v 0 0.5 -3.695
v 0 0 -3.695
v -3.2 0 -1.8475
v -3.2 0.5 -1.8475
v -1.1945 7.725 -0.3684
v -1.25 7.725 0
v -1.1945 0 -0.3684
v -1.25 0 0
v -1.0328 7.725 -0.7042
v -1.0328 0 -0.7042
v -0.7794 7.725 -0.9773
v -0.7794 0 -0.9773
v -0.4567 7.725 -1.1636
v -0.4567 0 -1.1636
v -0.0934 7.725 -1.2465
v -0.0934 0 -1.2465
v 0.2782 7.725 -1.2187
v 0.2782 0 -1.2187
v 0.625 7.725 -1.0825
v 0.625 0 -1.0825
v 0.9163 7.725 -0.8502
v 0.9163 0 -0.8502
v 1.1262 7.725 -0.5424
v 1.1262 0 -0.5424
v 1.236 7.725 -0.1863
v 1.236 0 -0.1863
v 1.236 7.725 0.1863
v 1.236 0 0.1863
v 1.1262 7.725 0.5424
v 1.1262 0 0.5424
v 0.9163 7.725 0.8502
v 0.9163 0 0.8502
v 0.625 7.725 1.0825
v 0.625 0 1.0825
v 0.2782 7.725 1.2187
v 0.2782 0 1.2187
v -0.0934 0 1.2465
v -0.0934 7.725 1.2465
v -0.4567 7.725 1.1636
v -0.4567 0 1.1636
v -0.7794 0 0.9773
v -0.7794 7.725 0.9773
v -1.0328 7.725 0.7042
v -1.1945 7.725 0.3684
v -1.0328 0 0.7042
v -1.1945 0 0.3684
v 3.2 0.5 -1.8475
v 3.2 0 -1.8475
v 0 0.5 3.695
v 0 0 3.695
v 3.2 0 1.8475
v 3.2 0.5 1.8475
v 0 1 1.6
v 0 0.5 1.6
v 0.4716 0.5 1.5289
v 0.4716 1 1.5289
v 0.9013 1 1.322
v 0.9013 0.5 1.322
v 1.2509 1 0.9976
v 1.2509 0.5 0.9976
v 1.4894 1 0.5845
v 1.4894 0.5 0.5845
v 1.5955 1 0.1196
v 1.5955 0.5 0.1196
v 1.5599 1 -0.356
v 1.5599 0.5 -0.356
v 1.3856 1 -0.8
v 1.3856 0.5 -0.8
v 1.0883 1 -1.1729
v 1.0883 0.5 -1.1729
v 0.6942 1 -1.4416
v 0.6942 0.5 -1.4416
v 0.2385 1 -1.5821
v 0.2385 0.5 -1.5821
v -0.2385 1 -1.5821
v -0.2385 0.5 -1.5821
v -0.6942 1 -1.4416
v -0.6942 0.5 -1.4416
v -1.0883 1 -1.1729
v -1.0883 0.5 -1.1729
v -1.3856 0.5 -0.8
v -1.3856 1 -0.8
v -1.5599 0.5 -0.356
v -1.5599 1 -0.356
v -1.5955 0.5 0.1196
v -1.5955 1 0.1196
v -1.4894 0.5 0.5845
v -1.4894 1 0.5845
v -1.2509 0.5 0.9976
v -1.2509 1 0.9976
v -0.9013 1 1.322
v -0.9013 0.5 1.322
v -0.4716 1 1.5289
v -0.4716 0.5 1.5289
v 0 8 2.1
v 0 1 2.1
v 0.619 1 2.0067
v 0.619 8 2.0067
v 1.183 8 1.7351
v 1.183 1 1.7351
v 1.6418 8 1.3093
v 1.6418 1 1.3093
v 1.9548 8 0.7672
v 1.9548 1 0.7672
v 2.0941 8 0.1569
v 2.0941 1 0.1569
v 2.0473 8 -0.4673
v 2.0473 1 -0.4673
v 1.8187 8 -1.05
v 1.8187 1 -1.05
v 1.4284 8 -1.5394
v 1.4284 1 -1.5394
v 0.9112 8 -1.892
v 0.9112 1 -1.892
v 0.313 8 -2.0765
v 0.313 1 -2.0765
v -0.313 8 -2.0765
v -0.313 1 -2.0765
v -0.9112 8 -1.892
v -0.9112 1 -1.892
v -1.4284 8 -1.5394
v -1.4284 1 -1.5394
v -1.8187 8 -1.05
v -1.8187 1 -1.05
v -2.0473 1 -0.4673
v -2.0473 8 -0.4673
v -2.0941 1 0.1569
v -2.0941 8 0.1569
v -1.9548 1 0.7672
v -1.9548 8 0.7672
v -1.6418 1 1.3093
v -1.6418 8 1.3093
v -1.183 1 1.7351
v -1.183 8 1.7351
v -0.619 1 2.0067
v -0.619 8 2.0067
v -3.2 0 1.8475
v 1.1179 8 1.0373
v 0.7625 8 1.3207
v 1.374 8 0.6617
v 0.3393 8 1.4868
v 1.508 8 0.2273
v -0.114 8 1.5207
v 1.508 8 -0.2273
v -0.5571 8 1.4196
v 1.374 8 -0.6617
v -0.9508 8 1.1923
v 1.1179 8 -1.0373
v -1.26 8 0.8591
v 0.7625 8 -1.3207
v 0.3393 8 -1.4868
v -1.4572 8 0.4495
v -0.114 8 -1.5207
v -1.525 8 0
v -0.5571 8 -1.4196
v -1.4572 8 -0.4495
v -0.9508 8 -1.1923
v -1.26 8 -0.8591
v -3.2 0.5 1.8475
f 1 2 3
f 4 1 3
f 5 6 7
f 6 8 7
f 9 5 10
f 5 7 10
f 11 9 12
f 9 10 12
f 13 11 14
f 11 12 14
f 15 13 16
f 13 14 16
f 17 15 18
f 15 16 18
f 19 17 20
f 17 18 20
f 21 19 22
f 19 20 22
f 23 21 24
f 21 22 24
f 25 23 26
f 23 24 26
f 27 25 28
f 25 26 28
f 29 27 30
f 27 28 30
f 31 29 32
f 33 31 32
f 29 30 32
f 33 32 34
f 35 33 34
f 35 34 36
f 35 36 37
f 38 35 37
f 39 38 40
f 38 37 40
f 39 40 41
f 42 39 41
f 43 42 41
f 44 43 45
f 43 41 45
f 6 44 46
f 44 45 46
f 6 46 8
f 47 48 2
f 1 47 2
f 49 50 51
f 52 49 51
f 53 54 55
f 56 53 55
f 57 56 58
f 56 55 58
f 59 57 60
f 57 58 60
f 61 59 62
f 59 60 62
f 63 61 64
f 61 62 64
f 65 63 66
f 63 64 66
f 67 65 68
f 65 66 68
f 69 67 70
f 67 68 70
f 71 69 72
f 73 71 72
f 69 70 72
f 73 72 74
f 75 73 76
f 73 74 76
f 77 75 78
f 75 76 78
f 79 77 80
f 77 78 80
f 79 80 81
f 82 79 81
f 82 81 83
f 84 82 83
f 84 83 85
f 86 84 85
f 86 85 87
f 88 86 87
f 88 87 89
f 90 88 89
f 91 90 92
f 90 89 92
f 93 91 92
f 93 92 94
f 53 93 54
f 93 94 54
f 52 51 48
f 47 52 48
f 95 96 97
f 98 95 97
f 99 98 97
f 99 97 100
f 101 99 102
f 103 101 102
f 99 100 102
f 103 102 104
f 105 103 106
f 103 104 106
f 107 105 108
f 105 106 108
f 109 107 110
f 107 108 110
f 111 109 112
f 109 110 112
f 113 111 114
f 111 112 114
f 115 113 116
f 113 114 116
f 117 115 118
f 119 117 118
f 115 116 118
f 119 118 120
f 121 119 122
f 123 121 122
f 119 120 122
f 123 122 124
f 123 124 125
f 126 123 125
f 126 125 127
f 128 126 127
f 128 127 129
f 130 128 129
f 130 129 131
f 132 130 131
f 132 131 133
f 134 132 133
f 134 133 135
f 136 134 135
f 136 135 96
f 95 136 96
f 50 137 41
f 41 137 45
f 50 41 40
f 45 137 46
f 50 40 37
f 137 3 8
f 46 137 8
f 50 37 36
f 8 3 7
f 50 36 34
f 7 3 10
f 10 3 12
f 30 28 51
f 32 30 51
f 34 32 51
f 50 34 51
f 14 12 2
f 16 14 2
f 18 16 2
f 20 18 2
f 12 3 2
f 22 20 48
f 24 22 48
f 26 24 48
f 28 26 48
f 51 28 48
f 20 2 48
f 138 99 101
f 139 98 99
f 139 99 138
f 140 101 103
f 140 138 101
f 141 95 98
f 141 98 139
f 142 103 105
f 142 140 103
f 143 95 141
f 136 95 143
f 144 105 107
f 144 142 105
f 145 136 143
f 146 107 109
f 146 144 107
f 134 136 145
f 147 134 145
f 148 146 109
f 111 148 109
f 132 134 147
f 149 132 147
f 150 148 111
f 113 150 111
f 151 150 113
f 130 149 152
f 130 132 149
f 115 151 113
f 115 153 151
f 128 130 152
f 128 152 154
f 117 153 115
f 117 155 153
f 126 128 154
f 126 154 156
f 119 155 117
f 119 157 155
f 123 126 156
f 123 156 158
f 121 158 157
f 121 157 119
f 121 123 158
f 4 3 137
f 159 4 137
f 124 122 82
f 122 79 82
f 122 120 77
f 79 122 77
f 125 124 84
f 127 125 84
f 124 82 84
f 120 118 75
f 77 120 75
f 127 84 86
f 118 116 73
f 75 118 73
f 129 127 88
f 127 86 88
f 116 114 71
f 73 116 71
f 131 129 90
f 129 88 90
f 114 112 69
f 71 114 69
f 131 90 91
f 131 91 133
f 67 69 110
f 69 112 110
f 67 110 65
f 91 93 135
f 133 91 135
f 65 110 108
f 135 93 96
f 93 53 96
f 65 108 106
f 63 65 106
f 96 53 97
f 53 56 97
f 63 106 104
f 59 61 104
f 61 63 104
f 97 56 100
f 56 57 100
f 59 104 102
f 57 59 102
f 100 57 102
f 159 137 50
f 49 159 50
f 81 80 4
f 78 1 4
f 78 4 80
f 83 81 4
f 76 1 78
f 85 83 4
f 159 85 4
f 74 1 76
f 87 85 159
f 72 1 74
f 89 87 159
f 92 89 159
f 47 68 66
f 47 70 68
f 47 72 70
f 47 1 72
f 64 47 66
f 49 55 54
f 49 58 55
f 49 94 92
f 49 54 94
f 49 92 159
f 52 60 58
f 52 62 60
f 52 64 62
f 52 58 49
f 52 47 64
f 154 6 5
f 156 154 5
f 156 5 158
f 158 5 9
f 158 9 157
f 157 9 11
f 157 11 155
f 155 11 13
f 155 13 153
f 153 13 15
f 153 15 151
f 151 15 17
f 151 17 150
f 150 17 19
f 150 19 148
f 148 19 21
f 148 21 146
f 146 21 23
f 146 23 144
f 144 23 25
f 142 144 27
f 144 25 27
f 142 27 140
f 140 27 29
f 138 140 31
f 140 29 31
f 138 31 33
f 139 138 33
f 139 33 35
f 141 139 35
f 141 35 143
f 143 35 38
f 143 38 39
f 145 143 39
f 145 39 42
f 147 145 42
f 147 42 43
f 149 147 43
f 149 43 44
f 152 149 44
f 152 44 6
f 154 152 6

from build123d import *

# Parameters (mm, degrees)
RESSALTO_EXTRUS_O1_START            = -4.5
RESSALTO_EXTRUS_O1_OUTLINE_R        = 2.5
RESSALTO_EXTRUS_O1_DEPTH            = 4.5
RESSALTO_EXTRUS_O1_START_2          = -3.5
RESSALTO_EXTRUS_O1_2_OUTLINE_R      = 2.695
RESSALTO_EXTRUS_O1_2_OUTLINE_R_2    = 2.5
RESSALTO_EXTRUS_O1_2_DEPTH          = 3.5
RESSALTO_EXTRUS_O1_3_OUTLINE_R      = 2.5
RESSALTO_EXTRUS_O1_3_DEPTH          = 0.5
ESBO_O2_R                           = 2.695
RESSALTO_EXTRUS_O2_DEPTH            = 3.5
FURO_ROSCADO_DE_M3X0_51_D           = 2.5
FURO_ROSCADO_DE_M3X0_51_CSINK_D     = 3.05
FURO_ROSCADO_DE_M3X0_51_CSINK_ANGLE = 90
CORTE_EXTRUS_O1_START               = -7.5
ESBO_O7_R                           = 2.695
ESBO_O7_R_2                         = 2.1
CORTE_EXTRUS_O1_DEPTH               = 7.5
ESBO_O8_R                           = 2.1
ESBO_O8_R_2                         = 1.6
CORTE_EXTRUS_O2_DEPTH               = 0.5


with BuildPart() as part:
    # Ressalto-extrusão1: read off the stored shape, not the designer's step
    # Ressalto-extrusão1 outline → Ressalto-extrusão1 (new body)
    with BuildSketch(Plane(origin=(0, 4.5, 0), x_dir=(1, 0, 0), z_dir=(0, 1, 0)).offset(RESSALTO_EXTRUS_O1_START)):
        Circle(RESSALTO_EXTRUS_O1_OUTLINE_R)
    extrude(amount=RESSALTO_EXTRUS_O1_DEPTH)

    # Ressalto-extrus_o1 2 outline → Ressalto-extrus_o1 2 (add)
    with BuildSketch(Plane(origin=(0, 4.5, 0), x_dir=(1, 0, 0), z_dir=(0, 1, 0)).offset(RESSALTO_EXTRUS_O1_START_2)):
        Circle(RESSALTO_EXTRUS_O1_2_OUTLINE_R)
        Circle(RESSALTO_EXTRUS_O1_2_OUTLINE_R_2, mode=Mode.SUBTRACT)
    extrude(amount=RESSALTO_EXTRUS_O1_2_DEPTH)

    # Ressalto-extrus_o1 3 outline → Ressalto-extrus_o1 3 (add)
    with BuildSketch(Plane(origin=(0, 4.5, 0), x_dir=(1, 0, 0), z_dir=(0, 1, 0)).offset(RESSALTO_EXTRUS_O1_START)):
        Polygon((0, 3.695041723), (-3.2, 1.847520861), (-3.2, -1.847520861), (0, -3.695041723), (3.2, -1.847520861), (3.2, 1.847520861), align=None)
        Circle(RESSALTO_EXTRUS_O1_3_OUTLINE_R, mode=Mode.SUBTRACT)
    extrude(amount=RESSALTO_EXTRUS_O1_3_DEPTH)

    # Esboço2 → Ressalto-extrusão2 (add)
    with BuildSketch(Plane(origin=(0, 4.5, 0), x_dir=(1, 0, 0), z_dir=(0, 1, 0))):
        with Locations(Location((0, 0, 0), (0, 0, 90))):
            Circle(ESBO_O2_R)
    extrude(amount=RESSALTO_EXTRUS_O2_DEPTH)

    # Furo roscado de M3x0.51 (through all)
    with Locations(Plane(origin=(0, 8, 0), x_dir=(1, 0, 0), z_dir=(0, 1, 0))):
        with Locations((0, 0)):
            CounterSinkHole(FURO_ROSCADO_DE_M3X0_51_D / 2, FURO_ROSCADO_DE_M3X0_51_CSINK_D / 2, counter_sink_angle=FURO_ROSCADO_DE_M3X0_51_CSINK_ANGLE)

    # Esboço7 → Corte-extrusão1 (cut)
    with BuildSketch(Plane(origin=(0, 8, 0), x_dir=(1, 0, 0), z_dir=(0, 1, 0)).offset(CORTE_EXTRUS_O1_START)):
        Circle(ESBO_O7_R)
        with Locations(Location((0, 0, 0), (0, 0, 270))):
            Circle(ESBO_O7_R_2, mode=Mode.SUBTRACT)
    extrude(amount=CORTE_EXTRUS_O1_DEPTH, mode=Mode.SUBTRACT)

    # Esboço8 → Corte-extrusão2 (cut)
    with BuildSketch(Plane(origin=(0, 0.5, 0), x_dir=(1, 0, 0), z_dir=(0, 1, 0))):
        with Locations(Location((0, 0, 0), (0, 0, 270))):
            Circle(ESBO_O8_R)
        with Locations(Location((0, 0, 0), (0, 0, 270))):
            Circle(ESBO_O8_R_2, mode=Mode.SUBTRACT)
    extrude(amount=CORTE_EXTRUS_O2_DEPTH, mode=Mode.SUBTRACT)


solid = part.part
